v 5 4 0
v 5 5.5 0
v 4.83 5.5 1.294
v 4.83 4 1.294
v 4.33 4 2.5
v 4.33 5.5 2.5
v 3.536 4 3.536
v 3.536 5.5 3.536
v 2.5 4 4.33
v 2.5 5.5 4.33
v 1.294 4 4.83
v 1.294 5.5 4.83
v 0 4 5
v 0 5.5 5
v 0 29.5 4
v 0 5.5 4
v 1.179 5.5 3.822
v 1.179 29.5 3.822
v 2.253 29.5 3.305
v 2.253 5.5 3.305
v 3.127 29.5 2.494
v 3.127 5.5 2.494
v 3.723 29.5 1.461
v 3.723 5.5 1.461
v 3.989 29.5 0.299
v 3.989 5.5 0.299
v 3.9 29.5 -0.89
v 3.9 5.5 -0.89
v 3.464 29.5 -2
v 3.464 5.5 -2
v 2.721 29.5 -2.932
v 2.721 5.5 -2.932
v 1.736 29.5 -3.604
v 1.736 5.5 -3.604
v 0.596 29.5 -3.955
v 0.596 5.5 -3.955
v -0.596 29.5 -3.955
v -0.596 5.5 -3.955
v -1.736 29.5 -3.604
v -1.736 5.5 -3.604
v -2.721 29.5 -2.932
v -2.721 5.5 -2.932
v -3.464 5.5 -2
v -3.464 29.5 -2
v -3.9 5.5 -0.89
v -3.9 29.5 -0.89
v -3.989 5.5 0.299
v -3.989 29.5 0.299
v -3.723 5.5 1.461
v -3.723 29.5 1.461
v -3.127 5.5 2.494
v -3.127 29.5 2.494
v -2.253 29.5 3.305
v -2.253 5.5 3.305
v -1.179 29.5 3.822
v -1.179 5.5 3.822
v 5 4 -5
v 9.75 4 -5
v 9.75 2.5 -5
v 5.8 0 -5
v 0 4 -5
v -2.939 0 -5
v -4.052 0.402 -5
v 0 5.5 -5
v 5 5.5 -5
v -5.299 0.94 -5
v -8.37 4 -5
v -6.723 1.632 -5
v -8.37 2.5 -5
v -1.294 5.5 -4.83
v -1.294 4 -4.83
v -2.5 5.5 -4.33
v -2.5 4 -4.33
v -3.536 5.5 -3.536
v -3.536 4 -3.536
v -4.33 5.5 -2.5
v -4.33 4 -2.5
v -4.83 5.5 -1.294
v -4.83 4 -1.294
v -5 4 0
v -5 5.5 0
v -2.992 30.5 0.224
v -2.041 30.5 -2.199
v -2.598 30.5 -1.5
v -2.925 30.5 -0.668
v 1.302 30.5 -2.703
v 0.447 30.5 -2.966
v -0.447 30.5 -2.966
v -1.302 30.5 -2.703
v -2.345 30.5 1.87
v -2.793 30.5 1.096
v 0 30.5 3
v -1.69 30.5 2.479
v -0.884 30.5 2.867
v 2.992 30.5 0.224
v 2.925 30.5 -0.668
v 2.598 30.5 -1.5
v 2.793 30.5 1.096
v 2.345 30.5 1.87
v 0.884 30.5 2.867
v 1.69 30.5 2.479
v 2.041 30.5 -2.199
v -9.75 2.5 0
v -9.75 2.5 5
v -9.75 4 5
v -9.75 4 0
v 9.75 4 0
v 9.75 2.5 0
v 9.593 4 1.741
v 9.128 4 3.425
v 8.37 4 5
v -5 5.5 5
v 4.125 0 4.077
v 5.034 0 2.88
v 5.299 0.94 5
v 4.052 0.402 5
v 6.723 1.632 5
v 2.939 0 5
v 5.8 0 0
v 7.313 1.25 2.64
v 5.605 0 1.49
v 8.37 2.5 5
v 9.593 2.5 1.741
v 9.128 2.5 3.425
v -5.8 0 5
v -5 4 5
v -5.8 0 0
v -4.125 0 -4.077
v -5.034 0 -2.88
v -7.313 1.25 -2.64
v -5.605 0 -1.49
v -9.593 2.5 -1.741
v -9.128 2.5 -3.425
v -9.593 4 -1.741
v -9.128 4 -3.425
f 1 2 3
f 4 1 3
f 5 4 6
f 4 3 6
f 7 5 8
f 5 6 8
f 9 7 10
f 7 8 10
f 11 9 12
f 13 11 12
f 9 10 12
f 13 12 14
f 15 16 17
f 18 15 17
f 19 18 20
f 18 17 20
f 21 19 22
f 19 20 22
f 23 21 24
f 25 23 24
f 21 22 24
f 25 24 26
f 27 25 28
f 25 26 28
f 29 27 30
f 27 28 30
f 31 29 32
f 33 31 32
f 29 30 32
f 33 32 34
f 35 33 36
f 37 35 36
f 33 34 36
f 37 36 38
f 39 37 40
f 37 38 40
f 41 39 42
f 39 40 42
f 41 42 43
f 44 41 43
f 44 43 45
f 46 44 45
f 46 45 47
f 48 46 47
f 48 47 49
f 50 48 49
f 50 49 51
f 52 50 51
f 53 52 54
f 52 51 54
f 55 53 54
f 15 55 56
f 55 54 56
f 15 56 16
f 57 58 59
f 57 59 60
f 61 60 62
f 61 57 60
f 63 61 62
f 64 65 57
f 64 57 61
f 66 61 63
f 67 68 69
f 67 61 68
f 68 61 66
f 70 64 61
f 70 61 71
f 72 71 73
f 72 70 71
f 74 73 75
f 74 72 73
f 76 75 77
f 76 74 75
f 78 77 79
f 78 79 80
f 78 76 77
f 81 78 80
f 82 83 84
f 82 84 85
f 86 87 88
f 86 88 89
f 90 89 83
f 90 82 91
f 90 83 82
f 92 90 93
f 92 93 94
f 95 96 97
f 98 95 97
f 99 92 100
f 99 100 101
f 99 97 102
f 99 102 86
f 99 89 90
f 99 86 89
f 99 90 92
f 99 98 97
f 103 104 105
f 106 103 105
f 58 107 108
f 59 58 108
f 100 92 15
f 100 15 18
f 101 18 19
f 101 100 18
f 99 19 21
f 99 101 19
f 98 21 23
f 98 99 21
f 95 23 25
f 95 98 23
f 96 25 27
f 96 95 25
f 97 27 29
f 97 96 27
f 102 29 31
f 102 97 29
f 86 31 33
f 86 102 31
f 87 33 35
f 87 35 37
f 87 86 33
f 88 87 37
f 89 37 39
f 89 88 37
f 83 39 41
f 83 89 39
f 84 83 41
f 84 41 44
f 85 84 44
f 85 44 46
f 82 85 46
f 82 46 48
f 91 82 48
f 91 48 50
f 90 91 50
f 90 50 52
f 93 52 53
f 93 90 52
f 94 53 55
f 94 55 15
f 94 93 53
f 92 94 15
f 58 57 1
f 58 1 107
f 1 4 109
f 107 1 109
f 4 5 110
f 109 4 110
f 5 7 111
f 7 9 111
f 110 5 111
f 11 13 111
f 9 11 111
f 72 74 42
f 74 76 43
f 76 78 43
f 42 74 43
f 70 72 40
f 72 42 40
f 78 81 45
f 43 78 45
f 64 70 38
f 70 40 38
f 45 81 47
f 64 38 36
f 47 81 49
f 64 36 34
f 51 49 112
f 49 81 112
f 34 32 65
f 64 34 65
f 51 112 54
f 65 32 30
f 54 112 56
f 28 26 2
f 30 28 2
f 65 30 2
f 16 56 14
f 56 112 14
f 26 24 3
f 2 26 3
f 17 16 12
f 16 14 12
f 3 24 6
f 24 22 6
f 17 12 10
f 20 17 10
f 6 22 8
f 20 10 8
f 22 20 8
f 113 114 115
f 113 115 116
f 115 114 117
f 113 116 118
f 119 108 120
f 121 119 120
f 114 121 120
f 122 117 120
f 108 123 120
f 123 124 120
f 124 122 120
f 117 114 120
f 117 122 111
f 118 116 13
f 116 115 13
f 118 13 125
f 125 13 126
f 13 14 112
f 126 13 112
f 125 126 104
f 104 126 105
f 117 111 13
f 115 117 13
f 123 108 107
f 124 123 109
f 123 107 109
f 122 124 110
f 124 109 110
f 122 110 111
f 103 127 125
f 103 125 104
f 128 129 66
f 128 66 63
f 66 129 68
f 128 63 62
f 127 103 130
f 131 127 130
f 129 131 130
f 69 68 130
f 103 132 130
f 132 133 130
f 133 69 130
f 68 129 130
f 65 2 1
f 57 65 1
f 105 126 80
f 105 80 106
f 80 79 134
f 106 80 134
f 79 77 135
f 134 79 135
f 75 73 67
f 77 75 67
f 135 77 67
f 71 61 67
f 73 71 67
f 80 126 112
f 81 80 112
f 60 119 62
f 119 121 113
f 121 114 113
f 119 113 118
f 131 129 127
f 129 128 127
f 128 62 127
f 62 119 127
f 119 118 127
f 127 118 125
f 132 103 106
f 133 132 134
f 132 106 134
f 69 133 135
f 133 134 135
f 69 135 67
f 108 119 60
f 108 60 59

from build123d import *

# Parameters (mm, degrees)
EXTRUDE_1_DEPTH     = 5
CUT_EXTRUDE_1_DEPTH = 1.5
SKETCH_2_R          = 4
EXTRUDE_2_DEPTH     = 25
CUT_EXTRUDE_2_DEPTH = 5
CHAMFER_2_SIZE      = 1


with BuildPart() as part:
    # Эскиз1 → Бобышка-Вытянуть1 (new body, symmetric)
    with BuildSketch(Plane.XY):
        Polygon((9.75, 0), (-9.75, 0), (-9.75, 4), (-5, 4), (-5, 5.5), (5, 5.5), (5, 4), (9.75, 4), align=None)
    extrude(amount=EXTRUDE_1_DEPTH, both=True)

    # Эскиз3 → Вырез-Вытянуть1 (cut)
    with BuildSketch(Plane(origin=(0, 5.5, 0), x_dir=(1, 0, 0), z_dir=(0, 1, 0))):
        with BuildLine():
            Line((-5, 0), (-5, 5))
            Line((-5, 5), (0, 5))
            ThreePointArc((0, 5), (-3.535533906, 3.535533906), (-5, 0))
        make_face()
        with BuildLine():
            Line((0, -5), (5, -5))
            Line((5, -5), (5, 0))
            ThreePointArc((5, 0), (3.535533906, -3.535533906), (0, -5))
        make_face()
    extrude(amount=-CUT_EXTRUDE_1_DEPTH, mode=Mode.SUBTRACT)

    # Эскиз2 → Бобышка-Вытянуть2 (add)
    with BuildSketch(Plane(origin=(0, 5.5, 0), x_dir=(1, 0, 0), z_dir=(0, 1, 0))):
        with Locations(Location((0, 0, 0), (0, 0, 270))):  # turned: the seam where the file's is
            Circle(SKETCH_2_R)
    extrude(amount=EXTRUDE_2_DEPTH)

    # Эскиз4 → Вырез-Вытянуть2 (cut, through all)
    with BuildSketch(Plane(origin=(0, 4, 0), x_dir=(1, 0, 0), z_dir=(0, 1, 0))):
        with BuildLine():
            Line((-8.370334521, 5), (-9.75, 5))
            Line((-9.75, 5), (-9.75, 0))
            ThreePointArc((-9.75, 0), (-9.398756875, 2.59342808), (-8.370334521, 5))
        make_face()
        with BuildLine():
            Line((8.370334521, -5), (9.75, -5))
            Line((9.75, -5), (9.75, 0))
            ThreePointArc((9.75, 0), (9.398756875, -2.59342808), (8.370334521, -5))
        make_face()
    extrude(amount=-CUT_EXTRUDE_2_DEPTH, mode=Mode.SUBTRACT)

    # Вырез-По траектории1: sweep along a path in Эскиз6
    with BuildLine(Plane.XZ) as sweep_1_path:
        Line((0, -9.75), (9.75, -9.75))
        Line((9.75, -9.75), (9.75, 0))
        ThreePointArc((9.75, 0), (6.894291117, 6.894291117), (0, 9.75))
        Line((0, 9.75), (-9.75, 9.75))
        Line((-9.75, 9.75), (-9.75, 0))
        ThreePointArc((-9.75, 0), (-6.894291117, -6.894291117), (0, -9.75))
    # Эскиз5 → Вырез-По траектории1 (sweep, cut)
    with BuildSketch(Plane.XY.offset(5)):
        Polygon((-9.75, 2.5), (-5.8, 0), (-9.75, 0), align=None)
    sweep(path=sweep_1_path.line, transition=Transition.RIGHT, mode=Mode.SUBTRACT)

    # Фаска2
    chamfer_2_edges = [part.edges().sort_by_distance(p)[0] for p in [
        (0, 30.5, -4),
    ]]
    chamfer(chamfer_2_edges, length=CHAMFER_2_SIZE)


solid = part.part
